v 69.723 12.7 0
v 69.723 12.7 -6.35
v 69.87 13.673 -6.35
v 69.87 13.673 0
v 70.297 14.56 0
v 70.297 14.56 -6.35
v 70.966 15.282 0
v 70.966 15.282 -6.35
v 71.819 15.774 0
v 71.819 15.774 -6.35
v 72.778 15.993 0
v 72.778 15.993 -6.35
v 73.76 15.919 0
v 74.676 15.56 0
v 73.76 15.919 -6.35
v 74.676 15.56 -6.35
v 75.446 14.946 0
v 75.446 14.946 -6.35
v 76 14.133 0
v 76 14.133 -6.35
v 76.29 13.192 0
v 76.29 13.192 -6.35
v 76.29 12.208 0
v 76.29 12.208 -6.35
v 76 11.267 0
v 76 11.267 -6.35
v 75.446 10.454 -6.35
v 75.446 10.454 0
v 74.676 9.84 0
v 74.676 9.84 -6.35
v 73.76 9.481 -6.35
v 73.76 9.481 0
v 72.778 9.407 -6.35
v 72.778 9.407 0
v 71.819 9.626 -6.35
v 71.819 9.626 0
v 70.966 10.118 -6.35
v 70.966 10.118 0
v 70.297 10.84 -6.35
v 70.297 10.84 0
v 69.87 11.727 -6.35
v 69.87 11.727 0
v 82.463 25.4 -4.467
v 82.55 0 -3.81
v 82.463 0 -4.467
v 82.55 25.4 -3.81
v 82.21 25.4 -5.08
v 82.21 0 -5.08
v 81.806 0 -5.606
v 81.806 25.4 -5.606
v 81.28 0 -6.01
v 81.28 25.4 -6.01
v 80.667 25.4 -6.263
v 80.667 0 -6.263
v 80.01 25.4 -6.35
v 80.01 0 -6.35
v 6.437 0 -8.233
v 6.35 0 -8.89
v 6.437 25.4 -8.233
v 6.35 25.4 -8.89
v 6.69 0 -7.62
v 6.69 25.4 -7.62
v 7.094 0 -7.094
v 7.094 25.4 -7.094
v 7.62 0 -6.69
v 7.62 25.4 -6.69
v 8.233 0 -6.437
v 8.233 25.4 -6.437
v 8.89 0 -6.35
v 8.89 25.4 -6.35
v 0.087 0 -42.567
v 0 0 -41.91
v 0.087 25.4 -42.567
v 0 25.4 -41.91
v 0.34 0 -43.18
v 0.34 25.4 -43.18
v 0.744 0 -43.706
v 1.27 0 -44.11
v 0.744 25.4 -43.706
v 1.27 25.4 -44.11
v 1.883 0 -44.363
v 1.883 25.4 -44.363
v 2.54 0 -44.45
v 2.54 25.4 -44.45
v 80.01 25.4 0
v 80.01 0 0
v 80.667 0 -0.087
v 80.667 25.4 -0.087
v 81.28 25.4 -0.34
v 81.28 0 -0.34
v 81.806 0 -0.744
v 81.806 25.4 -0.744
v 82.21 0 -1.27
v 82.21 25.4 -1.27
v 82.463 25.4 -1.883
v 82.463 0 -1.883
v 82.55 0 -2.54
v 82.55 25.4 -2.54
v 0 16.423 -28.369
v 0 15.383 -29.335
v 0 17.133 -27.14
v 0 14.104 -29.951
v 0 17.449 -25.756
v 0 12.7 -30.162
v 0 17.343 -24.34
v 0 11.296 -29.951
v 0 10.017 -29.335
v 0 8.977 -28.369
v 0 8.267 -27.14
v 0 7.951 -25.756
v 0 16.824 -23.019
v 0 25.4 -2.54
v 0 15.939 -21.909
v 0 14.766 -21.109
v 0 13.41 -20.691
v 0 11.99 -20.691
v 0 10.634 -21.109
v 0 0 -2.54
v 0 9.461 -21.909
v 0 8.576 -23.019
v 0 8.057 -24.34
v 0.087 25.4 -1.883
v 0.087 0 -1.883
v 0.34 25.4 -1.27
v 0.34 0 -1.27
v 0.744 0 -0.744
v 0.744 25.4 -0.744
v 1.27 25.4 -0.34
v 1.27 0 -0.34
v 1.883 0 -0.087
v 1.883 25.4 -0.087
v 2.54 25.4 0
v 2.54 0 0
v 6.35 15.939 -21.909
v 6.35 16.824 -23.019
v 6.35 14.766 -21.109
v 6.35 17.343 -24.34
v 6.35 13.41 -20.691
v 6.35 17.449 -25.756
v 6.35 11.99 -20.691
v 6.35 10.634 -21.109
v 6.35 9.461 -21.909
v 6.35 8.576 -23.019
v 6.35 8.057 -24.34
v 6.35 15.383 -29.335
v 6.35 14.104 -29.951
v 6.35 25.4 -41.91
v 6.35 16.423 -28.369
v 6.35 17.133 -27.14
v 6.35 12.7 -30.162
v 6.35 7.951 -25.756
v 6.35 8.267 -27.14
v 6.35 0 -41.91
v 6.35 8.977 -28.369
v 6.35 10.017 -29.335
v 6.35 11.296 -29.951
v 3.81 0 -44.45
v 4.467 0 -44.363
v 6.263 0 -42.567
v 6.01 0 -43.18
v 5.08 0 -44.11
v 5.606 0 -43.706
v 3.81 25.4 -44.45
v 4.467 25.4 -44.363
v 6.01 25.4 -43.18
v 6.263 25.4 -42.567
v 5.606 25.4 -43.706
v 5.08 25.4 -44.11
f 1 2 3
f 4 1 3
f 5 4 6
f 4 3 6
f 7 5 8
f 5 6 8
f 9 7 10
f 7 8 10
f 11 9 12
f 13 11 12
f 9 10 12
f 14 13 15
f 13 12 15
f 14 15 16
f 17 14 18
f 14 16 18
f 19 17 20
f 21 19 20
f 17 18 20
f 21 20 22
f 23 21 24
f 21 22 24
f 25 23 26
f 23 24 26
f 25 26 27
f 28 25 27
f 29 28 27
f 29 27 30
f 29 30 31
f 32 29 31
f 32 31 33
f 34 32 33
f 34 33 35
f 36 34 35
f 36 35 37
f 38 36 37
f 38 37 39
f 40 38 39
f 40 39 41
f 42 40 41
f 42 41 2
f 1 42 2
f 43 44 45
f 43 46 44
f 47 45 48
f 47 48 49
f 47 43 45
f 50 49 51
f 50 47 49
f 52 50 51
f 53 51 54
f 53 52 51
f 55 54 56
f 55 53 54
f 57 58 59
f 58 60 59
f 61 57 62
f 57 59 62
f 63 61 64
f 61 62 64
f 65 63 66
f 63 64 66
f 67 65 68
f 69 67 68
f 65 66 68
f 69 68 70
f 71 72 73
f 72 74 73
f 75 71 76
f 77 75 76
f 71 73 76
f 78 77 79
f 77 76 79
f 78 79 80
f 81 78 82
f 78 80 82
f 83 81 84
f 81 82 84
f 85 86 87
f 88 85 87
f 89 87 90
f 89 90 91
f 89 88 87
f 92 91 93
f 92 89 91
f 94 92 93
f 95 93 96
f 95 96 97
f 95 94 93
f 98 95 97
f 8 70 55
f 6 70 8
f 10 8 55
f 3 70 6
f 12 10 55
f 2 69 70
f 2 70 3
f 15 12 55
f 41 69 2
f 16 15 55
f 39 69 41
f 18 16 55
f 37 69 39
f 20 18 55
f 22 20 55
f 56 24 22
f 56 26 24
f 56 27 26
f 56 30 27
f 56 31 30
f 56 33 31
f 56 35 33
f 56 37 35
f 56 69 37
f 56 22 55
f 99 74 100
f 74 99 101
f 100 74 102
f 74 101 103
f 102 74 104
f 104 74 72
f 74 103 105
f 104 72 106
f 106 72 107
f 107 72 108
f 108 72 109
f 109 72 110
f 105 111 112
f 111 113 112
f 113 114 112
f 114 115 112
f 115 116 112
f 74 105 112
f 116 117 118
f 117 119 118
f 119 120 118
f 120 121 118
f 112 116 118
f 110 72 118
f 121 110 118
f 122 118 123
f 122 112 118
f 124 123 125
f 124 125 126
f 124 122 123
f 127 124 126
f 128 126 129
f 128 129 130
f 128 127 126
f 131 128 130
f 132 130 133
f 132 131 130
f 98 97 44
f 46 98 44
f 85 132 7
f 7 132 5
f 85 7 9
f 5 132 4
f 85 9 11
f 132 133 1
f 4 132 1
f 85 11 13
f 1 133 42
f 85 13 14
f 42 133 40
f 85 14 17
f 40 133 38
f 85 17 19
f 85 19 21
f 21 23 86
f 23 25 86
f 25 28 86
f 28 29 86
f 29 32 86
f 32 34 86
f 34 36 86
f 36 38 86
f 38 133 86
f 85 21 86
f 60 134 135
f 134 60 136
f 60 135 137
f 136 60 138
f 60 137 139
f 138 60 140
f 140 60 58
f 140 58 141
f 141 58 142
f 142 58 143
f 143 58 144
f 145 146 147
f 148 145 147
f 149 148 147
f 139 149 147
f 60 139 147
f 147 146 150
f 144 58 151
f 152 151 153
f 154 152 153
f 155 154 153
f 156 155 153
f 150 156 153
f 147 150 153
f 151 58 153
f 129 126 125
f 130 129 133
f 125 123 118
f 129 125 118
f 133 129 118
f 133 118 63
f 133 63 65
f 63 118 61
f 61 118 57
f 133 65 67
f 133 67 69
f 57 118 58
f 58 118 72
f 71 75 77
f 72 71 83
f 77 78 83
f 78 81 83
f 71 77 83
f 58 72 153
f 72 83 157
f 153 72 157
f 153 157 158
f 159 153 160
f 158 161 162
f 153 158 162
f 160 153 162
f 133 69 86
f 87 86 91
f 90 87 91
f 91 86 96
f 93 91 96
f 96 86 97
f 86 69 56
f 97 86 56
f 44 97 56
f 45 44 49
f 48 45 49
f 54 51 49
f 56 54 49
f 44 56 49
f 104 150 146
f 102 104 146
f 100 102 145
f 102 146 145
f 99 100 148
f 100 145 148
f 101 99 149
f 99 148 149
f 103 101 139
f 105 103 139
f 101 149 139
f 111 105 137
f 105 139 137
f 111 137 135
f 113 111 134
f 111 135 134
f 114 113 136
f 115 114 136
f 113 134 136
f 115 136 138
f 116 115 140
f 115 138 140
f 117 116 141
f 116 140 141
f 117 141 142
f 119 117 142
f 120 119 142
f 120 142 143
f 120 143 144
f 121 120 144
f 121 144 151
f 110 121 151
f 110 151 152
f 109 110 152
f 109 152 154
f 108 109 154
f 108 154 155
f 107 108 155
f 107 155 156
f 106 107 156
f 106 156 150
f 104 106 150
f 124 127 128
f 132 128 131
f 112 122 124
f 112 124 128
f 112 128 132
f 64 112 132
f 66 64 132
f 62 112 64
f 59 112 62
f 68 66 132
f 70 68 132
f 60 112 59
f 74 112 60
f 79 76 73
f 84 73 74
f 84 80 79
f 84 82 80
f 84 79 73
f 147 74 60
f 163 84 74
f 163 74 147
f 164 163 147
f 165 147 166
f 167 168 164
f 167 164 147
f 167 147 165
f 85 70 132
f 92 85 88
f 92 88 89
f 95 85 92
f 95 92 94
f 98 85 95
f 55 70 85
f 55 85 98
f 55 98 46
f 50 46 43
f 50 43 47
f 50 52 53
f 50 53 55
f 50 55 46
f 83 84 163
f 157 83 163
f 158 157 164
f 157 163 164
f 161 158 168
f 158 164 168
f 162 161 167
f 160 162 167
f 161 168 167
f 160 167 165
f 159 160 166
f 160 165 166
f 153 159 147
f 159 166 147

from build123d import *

# Parameters (mm, degrees)
SKETCH1_W           = 6.35
SKETCH1_H           = 38.1
SKETCH1_H_2         = 6.35
SKETCH1_W_2         = 76.2
BOSS_EXTRUDE1_DEPTH = 25.4
SKETCH2_R           = 3.302
CUT_EXTRUDE1_DEPTH  = 7.35
SKETCH3_R           = 4.7625
CUT_EXTRUDE2_DEPTH  = 7.35
FILLET1_R           = 2.54


with BuildPart() as part:
    # Sketch1 → Boss-Extrude1 (new body)
    with BuildSketch(Plane(origin=(0, 0, 0), x_dir=(1, 0, 0), z_dir=(0, 1, 0))):
        with Locations((3.175, 25.4)):
            Rectangle(SKETCH1_W, SKETCH1_H)
        with Locations((3.175, 3.175)):
            Rectangle(SKETCH1_W, SKETCH1_H_2)
        with Locations((44.45, 3.175)):
            Rectangle(SKETCH1_W_2, SKETCH1_H_2)
    extrude(amount=BOSS_EXTRUDE1_DEPTH)

    # Sketch2 → Cut-Extrude1 (cut, through all)
    with BuildSketch(Plane(origin=(0, 0, -6.35), x_dir=(-1, 0, 0), z_dir=(0, 0, -1))):
        with Locations((-73.025, 12.7)):
            Circle(SKETCH2_R)
    extrude(amount=-CUT_EXTRUDE1_DEPTH, mode=Mode.SUBTRACT)

    # Sketch3 → Cut-Extrude2 (cut, through all)
    with BuildSketch(Plane(origin=(6.35, 0, 0), x_dir=(0, 0, -1), z_dir=(1, 0, 0))):
        with Locations((25.4, 12.7)):
            Circle(SKETCH3_R)
    extrude(amount=-CUT_EXTRUDE2_DEPTH, mode=Mode.SUBTRACT)

    # Fillet1
    fillet1_edges = [part.edges().sort_by_distance(p)[0] for p in [
        (0, 12.7, -44.45),
        (6.35, 12.7, -44.45),
        (6.35, 12.7, -6.35),
        (82.55, 12.7, -6.35),
        (82.55, 12.7, 0),
        (0, 12.7, 0),
    ]]
    fillet(fillet1_edges, radius=FILLET1_R)


solid = part.part
